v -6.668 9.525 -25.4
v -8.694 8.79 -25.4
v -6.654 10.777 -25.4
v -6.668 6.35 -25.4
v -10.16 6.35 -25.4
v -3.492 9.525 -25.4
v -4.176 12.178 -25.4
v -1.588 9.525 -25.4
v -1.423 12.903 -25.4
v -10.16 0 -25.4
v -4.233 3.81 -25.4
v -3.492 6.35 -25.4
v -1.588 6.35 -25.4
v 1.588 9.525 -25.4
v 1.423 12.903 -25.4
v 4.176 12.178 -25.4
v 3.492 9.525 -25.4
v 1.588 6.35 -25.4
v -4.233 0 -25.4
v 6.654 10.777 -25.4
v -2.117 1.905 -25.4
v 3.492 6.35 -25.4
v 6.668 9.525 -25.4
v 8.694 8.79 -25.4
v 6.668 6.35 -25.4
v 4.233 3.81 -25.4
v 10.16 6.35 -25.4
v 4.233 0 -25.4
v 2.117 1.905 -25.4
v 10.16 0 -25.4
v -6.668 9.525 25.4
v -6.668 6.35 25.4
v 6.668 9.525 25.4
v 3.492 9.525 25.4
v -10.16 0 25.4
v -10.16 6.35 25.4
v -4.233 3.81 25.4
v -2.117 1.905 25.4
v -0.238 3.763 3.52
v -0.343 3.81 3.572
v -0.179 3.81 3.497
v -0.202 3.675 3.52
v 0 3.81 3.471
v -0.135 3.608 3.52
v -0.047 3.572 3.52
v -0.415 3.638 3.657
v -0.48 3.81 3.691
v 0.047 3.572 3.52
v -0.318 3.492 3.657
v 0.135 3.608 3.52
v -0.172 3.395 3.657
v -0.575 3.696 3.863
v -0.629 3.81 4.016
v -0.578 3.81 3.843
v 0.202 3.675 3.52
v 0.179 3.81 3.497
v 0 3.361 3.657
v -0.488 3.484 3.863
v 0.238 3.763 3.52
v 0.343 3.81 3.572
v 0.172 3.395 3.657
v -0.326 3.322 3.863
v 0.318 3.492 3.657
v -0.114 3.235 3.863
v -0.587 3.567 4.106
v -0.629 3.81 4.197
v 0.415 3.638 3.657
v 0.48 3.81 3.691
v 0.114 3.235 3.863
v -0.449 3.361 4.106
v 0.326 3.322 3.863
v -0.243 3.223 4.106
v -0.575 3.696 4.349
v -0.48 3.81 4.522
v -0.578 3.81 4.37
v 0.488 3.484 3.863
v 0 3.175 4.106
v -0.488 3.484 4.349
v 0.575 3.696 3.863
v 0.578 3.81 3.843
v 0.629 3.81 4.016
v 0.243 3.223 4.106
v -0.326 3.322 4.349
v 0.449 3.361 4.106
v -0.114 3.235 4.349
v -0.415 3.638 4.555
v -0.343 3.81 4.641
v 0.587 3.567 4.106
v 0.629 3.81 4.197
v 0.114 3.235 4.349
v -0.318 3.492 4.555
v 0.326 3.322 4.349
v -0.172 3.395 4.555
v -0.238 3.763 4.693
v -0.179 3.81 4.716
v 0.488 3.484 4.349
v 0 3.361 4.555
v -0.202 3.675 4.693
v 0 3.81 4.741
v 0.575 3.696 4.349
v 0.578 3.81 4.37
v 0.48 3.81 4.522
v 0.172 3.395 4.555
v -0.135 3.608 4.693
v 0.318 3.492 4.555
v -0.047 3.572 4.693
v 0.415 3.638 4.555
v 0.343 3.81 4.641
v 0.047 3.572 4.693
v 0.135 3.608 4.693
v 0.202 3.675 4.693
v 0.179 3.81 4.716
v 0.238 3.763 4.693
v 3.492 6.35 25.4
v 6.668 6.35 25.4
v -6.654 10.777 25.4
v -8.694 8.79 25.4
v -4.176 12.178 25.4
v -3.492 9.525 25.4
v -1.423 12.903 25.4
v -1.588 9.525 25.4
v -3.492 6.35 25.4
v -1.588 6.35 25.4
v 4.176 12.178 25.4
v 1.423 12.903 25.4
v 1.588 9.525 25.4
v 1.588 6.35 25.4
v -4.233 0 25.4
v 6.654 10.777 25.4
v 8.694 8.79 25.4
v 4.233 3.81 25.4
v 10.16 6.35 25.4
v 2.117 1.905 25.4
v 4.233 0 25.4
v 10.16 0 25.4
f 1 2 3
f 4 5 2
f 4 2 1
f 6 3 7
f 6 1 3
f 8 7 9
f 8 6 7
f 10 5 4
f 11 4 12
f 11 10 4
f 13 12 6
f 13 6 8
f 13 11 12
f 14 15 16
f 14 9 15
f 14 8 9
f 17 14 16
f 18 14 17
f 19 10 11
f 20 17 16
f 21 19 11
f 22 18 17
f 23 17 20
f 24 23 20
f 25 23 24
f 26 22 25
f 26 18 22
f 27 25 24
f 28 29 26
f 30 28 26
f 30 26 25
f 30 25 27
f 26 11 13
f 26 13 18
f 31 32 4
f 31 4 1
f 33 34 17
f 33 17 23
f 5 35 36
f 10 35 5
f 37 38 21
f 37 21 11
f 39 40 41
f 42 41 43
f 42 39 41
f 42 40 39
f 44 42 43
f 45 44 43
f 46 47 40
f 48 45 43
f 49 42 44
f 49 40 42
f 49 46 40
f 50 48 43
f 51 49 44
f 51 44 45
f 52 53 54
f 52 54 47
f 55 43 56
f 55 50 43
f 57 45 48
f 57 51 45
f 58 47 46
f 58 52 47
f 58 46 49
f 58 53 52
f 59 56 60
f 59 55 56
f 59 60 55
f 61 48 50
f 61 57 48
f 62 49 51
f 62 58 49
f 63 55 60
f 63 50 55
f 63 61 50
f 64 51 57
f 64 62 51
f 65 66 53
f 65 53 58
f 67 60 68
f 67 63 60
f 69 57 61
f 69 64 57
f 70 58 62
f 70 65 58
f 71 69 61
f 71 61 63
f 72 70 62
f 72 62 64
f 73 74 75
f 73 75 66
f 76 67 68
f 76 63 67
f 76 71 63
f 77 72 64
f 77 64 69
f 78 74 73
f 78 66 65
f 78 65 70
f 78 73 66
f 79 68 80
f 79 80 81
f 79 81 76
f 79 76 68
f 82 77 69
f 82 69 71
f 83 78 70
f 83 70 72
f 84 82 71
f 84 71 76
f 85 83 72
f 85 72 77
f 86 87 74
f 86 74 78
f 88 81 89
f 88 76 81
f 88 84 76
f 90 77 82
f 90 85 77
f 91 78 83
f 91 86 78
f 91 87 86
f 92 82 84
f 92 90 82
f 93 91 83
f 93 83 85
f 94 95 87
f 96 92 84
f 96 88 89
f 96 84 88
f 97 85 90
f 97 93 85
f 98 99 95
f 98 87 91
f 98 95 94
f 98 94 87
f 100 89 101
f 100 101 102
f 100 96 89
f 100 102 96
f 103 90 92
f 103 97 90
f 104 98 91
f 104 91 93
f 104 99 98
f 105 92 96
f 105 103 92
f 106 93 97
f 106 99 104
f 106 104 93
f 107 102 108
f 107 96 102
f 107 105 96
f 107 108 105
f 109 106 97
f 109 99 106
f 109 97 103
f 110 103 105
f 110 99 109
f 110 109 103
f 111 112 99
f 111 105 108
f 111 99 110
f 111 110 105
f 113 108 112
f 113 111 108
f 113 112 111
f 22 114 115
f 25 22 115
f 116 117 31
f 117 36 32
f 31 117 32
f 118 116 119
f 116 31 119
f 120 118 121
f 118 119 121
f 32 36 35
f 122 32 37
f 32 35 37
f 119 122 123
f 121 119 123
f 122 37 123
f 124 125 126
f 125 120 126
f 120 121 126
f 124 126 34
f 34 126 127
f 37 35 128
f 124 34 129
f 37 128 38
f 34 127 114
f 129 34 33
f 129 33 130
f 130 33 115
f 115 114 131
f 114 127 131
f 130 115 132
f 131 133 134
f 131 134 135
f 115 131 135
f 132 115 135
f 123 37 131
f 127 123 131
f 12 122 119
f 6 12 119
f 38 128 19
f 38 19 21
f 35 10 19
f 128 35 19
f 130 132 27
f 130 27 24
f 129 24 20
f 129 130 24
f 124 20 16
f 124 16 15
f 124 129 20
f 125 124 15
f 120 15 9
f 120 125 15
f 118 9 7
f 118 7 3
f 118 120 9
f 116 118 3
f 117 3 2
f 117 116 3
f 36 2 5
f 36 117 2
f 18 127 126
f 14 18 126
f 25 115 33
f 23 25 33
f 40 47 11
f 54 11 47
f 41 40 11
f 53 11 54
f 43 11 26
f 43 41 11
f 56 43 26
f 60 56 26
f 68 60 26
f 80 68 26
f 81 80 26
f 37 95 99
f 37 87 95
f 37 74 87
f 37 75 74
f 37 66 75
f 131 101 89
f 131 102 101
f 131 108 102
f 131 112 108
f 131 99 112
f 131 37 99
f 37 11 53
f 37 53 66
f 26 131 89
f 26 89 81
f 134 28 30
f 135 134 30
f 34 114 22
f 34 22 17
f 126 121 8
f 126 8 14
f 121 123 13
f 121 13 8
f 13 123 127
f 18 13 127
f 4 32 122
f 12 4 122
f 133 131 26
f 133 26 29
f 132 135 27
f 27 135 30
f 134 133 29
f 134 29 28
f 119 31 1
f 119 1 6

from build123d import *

# Parameters (mm, degrees)
SKETCH1_W           = 20.32
SKETCH1_H           = 50.8
BOSS_EXTRUDE1_DEPTH = 19.05
CUT_EXTRUDE1_DEPTH  = 50.8
SKETCH5_W           = 3.175
SKETCH5_H           = 3.175
CUT_EXTRUDE2_DEPTH  = 50.8


with BuildPart() as part:
    # Sketch1 → Boss-Extrude1 (new body)
    with BuildSketch(Plane(origin=(0, 0, 0), x_dir=(1, 0, 0), z_dir=(0, 1, 0))):
        Rectangle(SKETCH1_W, SKETCH1_H)
    extrude(amount=BOSS_EXTRUDE1_DEPTH)

    # Sketch3 → Cut-Extrude1 (cut)
    with BuildSketch(Plane.XY.offset(25.4)):
        Polygon((-4.233333333, 3.81), (4.233333333, 3.81), (2.116666667, 1.905), (4.233333333, 0), (-4.233333333, 0), (-2.116666667, 1.905), align=None)
    extrude(amount=-CUT_EXTRUDE1_DEPTH, mode=Mode.SUBTRACT)

    # Sketch4 → Revolve1 (revolve)
    with BuildSketch(Plane.XZ.offset(-3.81)):
        with BuildLine():
            Line((0, 4.7413418), (0, 3.4713418))
            ThreePointArc((0, 3.4713418), (0.635, 4.1063418), (0, 4.7413418))
        make_face()
    revolve(axis=Axis((0, 3.81, -25.4), (0, 0, 1)))

    # Sketch5 → Cut-Extrude2 (cut)
    with BuildSketch(Plane.XY.offset(25.4)):
        with BuildLine():
            Line((-10.16, 6.35), (-10.16, 19.05))
            Line((-10.16, 19.05), (10.16, 19.05))
            Line((10.16, 19.05), (10.16, 6.35))
            ThreePointArc((10.16, 6.35), (0, 12.99479824), (-10.16, 6.35))
        make_face()
        with Locations((0, 7.9375)):
            Rectangle(SKETCH5_W, SKETCH5_H)
        with Locations((-5.08, 7.9375)):
            Rectangle(SKETCH5_W, SKETCH5_H)
        with Locations((5.08, 7.9375)):
            Rectangle(SKETCH5_W, SKETCH5_H)
    extrude(amount=-CUT_EXTRUDE2_DEPTH, mode=Mode.SUBTRACT)


solid = part.part
